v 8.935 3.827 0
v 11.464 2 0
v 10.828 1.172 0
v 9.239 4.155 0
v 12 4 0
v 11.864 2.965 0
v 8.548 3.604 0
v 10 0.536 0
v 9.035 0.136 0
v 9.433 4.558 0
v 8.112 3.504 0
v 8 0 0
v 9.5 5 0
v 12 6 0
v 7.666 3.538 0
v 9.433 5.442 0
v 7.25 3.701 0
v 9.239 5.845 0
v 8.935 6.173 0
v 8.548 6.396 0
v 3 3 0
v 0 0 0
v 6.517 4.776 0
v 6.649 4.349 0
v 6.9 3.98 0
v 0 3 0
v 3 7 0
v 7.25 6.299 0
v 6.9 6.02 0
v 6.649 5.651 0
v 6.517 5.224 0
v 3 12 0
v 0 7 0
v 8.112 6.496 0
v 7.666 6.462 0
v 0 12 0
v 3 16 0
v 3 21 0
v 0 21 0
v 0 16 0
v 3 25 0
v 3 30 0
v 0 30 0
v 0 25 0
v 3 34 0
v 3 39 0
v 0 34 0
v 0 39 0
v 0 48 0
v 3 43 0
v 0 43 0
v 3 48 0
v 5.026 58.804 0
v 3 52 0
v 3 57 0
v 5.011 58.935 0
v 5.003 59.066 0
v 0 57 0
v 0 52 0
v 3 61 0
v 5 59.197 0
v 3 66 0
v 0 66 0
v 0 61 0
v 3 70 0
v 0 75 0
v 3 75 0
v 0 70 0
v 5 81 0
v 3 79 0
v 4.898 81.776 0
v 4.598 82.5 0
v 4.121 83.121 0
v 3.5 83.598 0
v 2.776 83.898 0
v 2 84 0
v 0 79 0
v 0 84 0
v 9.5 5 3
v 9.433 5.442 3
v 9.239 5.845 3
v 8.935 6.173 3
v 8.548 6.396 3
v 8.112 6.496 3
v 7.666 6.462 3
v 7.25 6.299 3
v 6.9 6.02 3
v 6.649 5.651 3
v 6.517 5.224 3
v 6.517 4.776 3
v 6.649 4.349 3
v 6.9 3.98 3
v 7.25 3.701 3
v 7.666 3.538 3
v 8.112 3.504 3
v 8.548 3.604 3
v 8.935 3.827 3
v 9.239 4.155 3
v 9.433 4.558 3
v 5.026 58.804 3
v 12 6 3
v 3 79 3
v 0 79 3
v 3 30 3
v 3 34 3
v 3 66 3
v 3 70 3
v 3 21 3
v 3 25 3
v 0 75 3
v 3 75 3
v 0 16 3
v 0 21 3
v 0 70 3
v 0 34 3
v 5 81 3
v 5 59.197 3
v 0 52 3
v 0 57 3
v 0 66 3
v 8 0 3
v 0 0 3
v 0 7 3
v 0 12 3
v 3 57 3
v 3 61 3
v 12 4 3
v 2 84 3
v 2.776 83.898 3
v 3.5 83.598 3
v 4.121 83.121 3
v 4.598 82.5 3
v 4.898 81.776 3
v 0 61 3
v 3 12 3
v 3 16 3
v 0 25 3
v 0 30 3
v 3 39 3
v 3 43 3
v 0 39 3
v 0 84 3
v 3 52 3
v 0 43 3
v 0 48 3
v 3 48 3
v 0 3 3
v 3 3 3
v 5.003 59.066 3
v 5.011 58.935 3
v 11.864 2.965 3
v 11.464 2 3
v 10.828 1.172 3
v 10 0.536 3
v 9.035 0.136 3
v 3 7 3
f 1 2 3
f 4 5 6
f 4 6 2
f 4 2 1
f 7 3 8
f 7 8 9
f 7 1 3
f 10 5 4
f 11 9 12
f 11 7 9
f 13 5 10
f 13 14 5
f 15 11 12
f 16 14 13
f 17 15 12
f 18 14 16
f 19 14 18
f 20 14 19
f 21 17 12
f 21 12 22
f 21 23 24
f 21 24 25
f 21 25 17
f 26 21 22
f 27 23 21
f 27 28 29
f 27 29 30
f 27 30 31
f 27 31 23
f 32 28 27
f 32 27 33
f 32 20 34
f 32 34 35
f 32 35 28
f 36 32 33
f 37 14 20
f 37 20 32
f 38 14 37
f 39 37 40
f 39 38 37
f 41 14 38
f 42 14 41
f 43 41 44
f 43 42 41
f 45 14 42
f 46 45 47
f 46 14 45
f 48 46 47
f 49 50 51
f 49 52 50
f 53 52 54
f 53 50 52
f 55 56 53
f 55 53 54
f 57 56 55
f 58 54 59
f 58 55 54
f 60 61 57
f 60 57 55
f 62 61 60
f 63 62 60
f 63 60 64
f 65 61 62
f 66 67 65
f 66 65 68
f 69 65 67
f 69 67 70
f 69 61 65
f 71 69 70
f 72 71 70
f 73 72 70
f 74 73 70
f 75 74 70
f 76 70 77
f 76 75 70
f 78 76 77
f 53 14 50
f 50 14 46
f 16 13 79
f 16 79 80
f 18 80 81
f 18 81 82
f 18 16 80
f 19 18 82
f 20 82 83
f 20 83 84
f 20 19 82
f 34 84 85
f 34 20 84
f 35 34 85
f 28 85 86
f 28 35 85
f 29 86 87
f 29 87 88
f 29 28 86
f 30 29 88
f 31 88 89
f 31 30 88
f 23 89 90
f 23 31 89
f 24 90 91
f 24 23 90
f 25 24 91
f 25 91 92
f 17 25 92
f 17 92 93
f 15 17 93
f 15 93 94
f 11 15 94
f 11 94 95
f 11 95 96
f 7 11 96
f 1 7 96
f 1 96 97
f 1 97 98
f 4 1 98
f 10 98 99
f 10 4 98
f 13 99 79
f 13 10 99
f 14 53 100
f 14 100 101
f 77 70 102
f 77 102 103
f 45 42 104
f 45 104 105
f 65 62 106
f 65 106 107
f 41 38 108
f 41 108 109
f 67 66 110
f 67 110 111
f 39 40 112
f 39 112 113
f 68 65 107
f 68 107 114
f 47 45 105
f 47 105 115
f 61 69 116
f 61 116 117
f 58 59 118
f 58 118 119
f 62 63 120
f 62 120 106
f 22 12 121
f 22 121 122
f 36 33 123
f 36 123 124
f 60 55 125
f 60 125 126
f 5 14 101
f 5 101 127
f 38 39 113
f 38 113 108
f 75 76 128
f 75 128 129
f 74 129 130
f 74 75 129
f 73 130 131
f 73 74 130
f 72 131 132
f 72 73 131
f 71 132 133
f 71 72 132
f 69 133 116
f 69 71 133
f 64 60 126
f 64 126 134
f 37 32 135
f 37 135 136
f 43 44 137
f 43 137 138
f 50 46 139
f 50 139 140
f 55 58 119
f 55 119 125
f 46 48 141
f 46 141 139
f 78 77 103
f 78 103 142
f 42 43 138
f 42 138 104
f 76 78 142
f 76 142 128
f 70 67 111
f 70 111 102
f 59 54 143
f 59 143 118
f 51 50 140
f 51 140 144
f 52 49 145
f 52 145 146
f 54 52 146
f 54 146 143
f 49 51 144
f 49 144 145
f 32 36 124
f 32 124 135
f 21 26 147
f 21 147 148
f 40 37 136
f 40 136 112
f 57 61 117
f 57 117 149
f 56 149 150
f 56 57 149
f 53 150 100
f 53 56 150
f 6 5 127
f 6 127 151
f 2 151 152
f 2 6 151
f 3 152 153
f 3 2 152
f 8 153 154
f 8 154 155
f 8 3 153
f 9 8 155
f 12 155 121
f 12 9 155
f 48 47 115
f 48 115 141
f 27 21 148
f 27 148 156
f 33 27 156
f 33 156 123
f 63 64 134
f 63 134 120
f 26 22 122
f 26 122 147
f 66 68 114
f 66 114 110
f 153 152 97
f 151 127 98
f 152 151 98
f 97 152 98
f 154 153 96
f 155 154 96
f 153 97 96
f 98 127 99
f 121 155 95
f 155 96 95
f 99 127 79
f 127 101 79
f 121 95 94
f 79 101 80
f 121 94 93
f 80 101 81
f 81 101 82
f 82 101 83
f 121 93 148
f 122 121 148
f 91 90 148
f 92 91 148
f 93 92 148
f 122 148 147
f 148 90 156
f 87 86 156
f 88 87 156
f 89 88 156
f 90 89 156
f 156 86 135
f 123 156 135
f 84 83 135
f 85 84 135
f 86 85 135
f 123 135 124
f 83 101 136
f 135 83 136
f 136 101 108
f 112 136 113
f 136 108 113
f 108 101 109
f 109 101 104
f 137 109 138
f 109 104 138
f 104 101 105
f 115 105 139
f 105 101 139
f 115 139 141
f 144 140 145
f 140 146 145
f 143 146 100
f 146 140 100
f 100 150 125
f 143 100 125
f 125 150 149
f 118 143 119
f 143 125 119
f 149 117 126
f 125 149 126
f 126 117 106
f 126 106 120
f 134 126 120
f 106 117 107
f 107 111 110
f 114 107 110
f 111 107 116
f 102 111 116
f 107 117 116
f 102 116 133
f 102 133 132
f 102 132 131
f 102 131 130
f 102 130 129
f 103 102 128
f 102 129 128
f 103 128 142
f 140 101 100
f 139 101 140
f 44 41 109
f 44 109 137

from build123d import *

# Parameters (mm, degrees)
SKETCH1_R           = 1.5
BOSS_EXTRUDE1_DEPTH = 3


with BuildPart() as part:
    # Sketch1 → Boss-Extrude1 (new body)
    with BuildSketch(Plane.XY):
        with BuildLine():
            Line((0, 7), (0, 12))
            Line((0, 12), (3, 12))
            Line((3, 12), (3, 16))
            Line((3, 16), (0, 16))
            Line((0, 16), (0, 21))
            Line((0, 21), (3, 21))
            Line((3, 21), (3, 25))
            Line((3, 25), (0, 25))
            Line((0, 25), (0, 30))
            Line((0, 30), (3, 30))
            Line((3, 30), (3, 34))
            Line((3, 34), (0, 34))
            Line((0, 34), (0, 39))
            Line((0, 39), (3, 39))
            Line((3, 39), (3, 43))
            Line((3, 43), (0, 43))
            Line((0, 43), (0, 48))
            Line((0, 48), (3, 48))
            Line((3, 48), (3, 52))
            Line((3, 52), (0, 52))
            Line((0, 52), (0, 57))
            Line((0, 57), (3, 57))
            Line((3, 57), (3, 61))
            Line((3, 61), (0, 61))
            Line((0, 61), (0, 66))
            Line((0, 66), (3, 66))
            Line((3, 66), (3, 70))
            Line((3, 70), (0, 70))
            Line((0, 70), (0, 75))
            Line((0, 75), (3, 75))
            Line((3, 75), (3, 79))
            Line((3, 79), (0, 79))
            Line((0, 79), (0, 84))
            Line((0, 84), (2, 84))
            ThreePointArc((2, 84), (4.121320344, 83.121320344), (5, 81))
            Line((5, 81), (5, 59.197256694))
            ThreePointArc((5, 59.197256694), (5.006464082, 59.000425028), (5.02582847, 58.804441586))
            Line((5.02582847, 58.804441586), (12, 6))
            Line((12, 6), (12, 4))
            ThreePointArc((12, 4), (10.828427125, 1.171572875), (8, 0))
            Line((8, 0), (0, 0))
            Line((0, 0), (0, 3))
            Line((0, 3), (3, 3))
            Line((3, 3), (3, 7))
            Line((3, 7), (0, 7))
        make_face()
        with Locations((8, 5)):
            Circle(SKETCH1_R, mode=Mode.SUBTRACT)
    extrude(amount=BOSS_EXTRUDE1_DEPTH)


solid = part.part
